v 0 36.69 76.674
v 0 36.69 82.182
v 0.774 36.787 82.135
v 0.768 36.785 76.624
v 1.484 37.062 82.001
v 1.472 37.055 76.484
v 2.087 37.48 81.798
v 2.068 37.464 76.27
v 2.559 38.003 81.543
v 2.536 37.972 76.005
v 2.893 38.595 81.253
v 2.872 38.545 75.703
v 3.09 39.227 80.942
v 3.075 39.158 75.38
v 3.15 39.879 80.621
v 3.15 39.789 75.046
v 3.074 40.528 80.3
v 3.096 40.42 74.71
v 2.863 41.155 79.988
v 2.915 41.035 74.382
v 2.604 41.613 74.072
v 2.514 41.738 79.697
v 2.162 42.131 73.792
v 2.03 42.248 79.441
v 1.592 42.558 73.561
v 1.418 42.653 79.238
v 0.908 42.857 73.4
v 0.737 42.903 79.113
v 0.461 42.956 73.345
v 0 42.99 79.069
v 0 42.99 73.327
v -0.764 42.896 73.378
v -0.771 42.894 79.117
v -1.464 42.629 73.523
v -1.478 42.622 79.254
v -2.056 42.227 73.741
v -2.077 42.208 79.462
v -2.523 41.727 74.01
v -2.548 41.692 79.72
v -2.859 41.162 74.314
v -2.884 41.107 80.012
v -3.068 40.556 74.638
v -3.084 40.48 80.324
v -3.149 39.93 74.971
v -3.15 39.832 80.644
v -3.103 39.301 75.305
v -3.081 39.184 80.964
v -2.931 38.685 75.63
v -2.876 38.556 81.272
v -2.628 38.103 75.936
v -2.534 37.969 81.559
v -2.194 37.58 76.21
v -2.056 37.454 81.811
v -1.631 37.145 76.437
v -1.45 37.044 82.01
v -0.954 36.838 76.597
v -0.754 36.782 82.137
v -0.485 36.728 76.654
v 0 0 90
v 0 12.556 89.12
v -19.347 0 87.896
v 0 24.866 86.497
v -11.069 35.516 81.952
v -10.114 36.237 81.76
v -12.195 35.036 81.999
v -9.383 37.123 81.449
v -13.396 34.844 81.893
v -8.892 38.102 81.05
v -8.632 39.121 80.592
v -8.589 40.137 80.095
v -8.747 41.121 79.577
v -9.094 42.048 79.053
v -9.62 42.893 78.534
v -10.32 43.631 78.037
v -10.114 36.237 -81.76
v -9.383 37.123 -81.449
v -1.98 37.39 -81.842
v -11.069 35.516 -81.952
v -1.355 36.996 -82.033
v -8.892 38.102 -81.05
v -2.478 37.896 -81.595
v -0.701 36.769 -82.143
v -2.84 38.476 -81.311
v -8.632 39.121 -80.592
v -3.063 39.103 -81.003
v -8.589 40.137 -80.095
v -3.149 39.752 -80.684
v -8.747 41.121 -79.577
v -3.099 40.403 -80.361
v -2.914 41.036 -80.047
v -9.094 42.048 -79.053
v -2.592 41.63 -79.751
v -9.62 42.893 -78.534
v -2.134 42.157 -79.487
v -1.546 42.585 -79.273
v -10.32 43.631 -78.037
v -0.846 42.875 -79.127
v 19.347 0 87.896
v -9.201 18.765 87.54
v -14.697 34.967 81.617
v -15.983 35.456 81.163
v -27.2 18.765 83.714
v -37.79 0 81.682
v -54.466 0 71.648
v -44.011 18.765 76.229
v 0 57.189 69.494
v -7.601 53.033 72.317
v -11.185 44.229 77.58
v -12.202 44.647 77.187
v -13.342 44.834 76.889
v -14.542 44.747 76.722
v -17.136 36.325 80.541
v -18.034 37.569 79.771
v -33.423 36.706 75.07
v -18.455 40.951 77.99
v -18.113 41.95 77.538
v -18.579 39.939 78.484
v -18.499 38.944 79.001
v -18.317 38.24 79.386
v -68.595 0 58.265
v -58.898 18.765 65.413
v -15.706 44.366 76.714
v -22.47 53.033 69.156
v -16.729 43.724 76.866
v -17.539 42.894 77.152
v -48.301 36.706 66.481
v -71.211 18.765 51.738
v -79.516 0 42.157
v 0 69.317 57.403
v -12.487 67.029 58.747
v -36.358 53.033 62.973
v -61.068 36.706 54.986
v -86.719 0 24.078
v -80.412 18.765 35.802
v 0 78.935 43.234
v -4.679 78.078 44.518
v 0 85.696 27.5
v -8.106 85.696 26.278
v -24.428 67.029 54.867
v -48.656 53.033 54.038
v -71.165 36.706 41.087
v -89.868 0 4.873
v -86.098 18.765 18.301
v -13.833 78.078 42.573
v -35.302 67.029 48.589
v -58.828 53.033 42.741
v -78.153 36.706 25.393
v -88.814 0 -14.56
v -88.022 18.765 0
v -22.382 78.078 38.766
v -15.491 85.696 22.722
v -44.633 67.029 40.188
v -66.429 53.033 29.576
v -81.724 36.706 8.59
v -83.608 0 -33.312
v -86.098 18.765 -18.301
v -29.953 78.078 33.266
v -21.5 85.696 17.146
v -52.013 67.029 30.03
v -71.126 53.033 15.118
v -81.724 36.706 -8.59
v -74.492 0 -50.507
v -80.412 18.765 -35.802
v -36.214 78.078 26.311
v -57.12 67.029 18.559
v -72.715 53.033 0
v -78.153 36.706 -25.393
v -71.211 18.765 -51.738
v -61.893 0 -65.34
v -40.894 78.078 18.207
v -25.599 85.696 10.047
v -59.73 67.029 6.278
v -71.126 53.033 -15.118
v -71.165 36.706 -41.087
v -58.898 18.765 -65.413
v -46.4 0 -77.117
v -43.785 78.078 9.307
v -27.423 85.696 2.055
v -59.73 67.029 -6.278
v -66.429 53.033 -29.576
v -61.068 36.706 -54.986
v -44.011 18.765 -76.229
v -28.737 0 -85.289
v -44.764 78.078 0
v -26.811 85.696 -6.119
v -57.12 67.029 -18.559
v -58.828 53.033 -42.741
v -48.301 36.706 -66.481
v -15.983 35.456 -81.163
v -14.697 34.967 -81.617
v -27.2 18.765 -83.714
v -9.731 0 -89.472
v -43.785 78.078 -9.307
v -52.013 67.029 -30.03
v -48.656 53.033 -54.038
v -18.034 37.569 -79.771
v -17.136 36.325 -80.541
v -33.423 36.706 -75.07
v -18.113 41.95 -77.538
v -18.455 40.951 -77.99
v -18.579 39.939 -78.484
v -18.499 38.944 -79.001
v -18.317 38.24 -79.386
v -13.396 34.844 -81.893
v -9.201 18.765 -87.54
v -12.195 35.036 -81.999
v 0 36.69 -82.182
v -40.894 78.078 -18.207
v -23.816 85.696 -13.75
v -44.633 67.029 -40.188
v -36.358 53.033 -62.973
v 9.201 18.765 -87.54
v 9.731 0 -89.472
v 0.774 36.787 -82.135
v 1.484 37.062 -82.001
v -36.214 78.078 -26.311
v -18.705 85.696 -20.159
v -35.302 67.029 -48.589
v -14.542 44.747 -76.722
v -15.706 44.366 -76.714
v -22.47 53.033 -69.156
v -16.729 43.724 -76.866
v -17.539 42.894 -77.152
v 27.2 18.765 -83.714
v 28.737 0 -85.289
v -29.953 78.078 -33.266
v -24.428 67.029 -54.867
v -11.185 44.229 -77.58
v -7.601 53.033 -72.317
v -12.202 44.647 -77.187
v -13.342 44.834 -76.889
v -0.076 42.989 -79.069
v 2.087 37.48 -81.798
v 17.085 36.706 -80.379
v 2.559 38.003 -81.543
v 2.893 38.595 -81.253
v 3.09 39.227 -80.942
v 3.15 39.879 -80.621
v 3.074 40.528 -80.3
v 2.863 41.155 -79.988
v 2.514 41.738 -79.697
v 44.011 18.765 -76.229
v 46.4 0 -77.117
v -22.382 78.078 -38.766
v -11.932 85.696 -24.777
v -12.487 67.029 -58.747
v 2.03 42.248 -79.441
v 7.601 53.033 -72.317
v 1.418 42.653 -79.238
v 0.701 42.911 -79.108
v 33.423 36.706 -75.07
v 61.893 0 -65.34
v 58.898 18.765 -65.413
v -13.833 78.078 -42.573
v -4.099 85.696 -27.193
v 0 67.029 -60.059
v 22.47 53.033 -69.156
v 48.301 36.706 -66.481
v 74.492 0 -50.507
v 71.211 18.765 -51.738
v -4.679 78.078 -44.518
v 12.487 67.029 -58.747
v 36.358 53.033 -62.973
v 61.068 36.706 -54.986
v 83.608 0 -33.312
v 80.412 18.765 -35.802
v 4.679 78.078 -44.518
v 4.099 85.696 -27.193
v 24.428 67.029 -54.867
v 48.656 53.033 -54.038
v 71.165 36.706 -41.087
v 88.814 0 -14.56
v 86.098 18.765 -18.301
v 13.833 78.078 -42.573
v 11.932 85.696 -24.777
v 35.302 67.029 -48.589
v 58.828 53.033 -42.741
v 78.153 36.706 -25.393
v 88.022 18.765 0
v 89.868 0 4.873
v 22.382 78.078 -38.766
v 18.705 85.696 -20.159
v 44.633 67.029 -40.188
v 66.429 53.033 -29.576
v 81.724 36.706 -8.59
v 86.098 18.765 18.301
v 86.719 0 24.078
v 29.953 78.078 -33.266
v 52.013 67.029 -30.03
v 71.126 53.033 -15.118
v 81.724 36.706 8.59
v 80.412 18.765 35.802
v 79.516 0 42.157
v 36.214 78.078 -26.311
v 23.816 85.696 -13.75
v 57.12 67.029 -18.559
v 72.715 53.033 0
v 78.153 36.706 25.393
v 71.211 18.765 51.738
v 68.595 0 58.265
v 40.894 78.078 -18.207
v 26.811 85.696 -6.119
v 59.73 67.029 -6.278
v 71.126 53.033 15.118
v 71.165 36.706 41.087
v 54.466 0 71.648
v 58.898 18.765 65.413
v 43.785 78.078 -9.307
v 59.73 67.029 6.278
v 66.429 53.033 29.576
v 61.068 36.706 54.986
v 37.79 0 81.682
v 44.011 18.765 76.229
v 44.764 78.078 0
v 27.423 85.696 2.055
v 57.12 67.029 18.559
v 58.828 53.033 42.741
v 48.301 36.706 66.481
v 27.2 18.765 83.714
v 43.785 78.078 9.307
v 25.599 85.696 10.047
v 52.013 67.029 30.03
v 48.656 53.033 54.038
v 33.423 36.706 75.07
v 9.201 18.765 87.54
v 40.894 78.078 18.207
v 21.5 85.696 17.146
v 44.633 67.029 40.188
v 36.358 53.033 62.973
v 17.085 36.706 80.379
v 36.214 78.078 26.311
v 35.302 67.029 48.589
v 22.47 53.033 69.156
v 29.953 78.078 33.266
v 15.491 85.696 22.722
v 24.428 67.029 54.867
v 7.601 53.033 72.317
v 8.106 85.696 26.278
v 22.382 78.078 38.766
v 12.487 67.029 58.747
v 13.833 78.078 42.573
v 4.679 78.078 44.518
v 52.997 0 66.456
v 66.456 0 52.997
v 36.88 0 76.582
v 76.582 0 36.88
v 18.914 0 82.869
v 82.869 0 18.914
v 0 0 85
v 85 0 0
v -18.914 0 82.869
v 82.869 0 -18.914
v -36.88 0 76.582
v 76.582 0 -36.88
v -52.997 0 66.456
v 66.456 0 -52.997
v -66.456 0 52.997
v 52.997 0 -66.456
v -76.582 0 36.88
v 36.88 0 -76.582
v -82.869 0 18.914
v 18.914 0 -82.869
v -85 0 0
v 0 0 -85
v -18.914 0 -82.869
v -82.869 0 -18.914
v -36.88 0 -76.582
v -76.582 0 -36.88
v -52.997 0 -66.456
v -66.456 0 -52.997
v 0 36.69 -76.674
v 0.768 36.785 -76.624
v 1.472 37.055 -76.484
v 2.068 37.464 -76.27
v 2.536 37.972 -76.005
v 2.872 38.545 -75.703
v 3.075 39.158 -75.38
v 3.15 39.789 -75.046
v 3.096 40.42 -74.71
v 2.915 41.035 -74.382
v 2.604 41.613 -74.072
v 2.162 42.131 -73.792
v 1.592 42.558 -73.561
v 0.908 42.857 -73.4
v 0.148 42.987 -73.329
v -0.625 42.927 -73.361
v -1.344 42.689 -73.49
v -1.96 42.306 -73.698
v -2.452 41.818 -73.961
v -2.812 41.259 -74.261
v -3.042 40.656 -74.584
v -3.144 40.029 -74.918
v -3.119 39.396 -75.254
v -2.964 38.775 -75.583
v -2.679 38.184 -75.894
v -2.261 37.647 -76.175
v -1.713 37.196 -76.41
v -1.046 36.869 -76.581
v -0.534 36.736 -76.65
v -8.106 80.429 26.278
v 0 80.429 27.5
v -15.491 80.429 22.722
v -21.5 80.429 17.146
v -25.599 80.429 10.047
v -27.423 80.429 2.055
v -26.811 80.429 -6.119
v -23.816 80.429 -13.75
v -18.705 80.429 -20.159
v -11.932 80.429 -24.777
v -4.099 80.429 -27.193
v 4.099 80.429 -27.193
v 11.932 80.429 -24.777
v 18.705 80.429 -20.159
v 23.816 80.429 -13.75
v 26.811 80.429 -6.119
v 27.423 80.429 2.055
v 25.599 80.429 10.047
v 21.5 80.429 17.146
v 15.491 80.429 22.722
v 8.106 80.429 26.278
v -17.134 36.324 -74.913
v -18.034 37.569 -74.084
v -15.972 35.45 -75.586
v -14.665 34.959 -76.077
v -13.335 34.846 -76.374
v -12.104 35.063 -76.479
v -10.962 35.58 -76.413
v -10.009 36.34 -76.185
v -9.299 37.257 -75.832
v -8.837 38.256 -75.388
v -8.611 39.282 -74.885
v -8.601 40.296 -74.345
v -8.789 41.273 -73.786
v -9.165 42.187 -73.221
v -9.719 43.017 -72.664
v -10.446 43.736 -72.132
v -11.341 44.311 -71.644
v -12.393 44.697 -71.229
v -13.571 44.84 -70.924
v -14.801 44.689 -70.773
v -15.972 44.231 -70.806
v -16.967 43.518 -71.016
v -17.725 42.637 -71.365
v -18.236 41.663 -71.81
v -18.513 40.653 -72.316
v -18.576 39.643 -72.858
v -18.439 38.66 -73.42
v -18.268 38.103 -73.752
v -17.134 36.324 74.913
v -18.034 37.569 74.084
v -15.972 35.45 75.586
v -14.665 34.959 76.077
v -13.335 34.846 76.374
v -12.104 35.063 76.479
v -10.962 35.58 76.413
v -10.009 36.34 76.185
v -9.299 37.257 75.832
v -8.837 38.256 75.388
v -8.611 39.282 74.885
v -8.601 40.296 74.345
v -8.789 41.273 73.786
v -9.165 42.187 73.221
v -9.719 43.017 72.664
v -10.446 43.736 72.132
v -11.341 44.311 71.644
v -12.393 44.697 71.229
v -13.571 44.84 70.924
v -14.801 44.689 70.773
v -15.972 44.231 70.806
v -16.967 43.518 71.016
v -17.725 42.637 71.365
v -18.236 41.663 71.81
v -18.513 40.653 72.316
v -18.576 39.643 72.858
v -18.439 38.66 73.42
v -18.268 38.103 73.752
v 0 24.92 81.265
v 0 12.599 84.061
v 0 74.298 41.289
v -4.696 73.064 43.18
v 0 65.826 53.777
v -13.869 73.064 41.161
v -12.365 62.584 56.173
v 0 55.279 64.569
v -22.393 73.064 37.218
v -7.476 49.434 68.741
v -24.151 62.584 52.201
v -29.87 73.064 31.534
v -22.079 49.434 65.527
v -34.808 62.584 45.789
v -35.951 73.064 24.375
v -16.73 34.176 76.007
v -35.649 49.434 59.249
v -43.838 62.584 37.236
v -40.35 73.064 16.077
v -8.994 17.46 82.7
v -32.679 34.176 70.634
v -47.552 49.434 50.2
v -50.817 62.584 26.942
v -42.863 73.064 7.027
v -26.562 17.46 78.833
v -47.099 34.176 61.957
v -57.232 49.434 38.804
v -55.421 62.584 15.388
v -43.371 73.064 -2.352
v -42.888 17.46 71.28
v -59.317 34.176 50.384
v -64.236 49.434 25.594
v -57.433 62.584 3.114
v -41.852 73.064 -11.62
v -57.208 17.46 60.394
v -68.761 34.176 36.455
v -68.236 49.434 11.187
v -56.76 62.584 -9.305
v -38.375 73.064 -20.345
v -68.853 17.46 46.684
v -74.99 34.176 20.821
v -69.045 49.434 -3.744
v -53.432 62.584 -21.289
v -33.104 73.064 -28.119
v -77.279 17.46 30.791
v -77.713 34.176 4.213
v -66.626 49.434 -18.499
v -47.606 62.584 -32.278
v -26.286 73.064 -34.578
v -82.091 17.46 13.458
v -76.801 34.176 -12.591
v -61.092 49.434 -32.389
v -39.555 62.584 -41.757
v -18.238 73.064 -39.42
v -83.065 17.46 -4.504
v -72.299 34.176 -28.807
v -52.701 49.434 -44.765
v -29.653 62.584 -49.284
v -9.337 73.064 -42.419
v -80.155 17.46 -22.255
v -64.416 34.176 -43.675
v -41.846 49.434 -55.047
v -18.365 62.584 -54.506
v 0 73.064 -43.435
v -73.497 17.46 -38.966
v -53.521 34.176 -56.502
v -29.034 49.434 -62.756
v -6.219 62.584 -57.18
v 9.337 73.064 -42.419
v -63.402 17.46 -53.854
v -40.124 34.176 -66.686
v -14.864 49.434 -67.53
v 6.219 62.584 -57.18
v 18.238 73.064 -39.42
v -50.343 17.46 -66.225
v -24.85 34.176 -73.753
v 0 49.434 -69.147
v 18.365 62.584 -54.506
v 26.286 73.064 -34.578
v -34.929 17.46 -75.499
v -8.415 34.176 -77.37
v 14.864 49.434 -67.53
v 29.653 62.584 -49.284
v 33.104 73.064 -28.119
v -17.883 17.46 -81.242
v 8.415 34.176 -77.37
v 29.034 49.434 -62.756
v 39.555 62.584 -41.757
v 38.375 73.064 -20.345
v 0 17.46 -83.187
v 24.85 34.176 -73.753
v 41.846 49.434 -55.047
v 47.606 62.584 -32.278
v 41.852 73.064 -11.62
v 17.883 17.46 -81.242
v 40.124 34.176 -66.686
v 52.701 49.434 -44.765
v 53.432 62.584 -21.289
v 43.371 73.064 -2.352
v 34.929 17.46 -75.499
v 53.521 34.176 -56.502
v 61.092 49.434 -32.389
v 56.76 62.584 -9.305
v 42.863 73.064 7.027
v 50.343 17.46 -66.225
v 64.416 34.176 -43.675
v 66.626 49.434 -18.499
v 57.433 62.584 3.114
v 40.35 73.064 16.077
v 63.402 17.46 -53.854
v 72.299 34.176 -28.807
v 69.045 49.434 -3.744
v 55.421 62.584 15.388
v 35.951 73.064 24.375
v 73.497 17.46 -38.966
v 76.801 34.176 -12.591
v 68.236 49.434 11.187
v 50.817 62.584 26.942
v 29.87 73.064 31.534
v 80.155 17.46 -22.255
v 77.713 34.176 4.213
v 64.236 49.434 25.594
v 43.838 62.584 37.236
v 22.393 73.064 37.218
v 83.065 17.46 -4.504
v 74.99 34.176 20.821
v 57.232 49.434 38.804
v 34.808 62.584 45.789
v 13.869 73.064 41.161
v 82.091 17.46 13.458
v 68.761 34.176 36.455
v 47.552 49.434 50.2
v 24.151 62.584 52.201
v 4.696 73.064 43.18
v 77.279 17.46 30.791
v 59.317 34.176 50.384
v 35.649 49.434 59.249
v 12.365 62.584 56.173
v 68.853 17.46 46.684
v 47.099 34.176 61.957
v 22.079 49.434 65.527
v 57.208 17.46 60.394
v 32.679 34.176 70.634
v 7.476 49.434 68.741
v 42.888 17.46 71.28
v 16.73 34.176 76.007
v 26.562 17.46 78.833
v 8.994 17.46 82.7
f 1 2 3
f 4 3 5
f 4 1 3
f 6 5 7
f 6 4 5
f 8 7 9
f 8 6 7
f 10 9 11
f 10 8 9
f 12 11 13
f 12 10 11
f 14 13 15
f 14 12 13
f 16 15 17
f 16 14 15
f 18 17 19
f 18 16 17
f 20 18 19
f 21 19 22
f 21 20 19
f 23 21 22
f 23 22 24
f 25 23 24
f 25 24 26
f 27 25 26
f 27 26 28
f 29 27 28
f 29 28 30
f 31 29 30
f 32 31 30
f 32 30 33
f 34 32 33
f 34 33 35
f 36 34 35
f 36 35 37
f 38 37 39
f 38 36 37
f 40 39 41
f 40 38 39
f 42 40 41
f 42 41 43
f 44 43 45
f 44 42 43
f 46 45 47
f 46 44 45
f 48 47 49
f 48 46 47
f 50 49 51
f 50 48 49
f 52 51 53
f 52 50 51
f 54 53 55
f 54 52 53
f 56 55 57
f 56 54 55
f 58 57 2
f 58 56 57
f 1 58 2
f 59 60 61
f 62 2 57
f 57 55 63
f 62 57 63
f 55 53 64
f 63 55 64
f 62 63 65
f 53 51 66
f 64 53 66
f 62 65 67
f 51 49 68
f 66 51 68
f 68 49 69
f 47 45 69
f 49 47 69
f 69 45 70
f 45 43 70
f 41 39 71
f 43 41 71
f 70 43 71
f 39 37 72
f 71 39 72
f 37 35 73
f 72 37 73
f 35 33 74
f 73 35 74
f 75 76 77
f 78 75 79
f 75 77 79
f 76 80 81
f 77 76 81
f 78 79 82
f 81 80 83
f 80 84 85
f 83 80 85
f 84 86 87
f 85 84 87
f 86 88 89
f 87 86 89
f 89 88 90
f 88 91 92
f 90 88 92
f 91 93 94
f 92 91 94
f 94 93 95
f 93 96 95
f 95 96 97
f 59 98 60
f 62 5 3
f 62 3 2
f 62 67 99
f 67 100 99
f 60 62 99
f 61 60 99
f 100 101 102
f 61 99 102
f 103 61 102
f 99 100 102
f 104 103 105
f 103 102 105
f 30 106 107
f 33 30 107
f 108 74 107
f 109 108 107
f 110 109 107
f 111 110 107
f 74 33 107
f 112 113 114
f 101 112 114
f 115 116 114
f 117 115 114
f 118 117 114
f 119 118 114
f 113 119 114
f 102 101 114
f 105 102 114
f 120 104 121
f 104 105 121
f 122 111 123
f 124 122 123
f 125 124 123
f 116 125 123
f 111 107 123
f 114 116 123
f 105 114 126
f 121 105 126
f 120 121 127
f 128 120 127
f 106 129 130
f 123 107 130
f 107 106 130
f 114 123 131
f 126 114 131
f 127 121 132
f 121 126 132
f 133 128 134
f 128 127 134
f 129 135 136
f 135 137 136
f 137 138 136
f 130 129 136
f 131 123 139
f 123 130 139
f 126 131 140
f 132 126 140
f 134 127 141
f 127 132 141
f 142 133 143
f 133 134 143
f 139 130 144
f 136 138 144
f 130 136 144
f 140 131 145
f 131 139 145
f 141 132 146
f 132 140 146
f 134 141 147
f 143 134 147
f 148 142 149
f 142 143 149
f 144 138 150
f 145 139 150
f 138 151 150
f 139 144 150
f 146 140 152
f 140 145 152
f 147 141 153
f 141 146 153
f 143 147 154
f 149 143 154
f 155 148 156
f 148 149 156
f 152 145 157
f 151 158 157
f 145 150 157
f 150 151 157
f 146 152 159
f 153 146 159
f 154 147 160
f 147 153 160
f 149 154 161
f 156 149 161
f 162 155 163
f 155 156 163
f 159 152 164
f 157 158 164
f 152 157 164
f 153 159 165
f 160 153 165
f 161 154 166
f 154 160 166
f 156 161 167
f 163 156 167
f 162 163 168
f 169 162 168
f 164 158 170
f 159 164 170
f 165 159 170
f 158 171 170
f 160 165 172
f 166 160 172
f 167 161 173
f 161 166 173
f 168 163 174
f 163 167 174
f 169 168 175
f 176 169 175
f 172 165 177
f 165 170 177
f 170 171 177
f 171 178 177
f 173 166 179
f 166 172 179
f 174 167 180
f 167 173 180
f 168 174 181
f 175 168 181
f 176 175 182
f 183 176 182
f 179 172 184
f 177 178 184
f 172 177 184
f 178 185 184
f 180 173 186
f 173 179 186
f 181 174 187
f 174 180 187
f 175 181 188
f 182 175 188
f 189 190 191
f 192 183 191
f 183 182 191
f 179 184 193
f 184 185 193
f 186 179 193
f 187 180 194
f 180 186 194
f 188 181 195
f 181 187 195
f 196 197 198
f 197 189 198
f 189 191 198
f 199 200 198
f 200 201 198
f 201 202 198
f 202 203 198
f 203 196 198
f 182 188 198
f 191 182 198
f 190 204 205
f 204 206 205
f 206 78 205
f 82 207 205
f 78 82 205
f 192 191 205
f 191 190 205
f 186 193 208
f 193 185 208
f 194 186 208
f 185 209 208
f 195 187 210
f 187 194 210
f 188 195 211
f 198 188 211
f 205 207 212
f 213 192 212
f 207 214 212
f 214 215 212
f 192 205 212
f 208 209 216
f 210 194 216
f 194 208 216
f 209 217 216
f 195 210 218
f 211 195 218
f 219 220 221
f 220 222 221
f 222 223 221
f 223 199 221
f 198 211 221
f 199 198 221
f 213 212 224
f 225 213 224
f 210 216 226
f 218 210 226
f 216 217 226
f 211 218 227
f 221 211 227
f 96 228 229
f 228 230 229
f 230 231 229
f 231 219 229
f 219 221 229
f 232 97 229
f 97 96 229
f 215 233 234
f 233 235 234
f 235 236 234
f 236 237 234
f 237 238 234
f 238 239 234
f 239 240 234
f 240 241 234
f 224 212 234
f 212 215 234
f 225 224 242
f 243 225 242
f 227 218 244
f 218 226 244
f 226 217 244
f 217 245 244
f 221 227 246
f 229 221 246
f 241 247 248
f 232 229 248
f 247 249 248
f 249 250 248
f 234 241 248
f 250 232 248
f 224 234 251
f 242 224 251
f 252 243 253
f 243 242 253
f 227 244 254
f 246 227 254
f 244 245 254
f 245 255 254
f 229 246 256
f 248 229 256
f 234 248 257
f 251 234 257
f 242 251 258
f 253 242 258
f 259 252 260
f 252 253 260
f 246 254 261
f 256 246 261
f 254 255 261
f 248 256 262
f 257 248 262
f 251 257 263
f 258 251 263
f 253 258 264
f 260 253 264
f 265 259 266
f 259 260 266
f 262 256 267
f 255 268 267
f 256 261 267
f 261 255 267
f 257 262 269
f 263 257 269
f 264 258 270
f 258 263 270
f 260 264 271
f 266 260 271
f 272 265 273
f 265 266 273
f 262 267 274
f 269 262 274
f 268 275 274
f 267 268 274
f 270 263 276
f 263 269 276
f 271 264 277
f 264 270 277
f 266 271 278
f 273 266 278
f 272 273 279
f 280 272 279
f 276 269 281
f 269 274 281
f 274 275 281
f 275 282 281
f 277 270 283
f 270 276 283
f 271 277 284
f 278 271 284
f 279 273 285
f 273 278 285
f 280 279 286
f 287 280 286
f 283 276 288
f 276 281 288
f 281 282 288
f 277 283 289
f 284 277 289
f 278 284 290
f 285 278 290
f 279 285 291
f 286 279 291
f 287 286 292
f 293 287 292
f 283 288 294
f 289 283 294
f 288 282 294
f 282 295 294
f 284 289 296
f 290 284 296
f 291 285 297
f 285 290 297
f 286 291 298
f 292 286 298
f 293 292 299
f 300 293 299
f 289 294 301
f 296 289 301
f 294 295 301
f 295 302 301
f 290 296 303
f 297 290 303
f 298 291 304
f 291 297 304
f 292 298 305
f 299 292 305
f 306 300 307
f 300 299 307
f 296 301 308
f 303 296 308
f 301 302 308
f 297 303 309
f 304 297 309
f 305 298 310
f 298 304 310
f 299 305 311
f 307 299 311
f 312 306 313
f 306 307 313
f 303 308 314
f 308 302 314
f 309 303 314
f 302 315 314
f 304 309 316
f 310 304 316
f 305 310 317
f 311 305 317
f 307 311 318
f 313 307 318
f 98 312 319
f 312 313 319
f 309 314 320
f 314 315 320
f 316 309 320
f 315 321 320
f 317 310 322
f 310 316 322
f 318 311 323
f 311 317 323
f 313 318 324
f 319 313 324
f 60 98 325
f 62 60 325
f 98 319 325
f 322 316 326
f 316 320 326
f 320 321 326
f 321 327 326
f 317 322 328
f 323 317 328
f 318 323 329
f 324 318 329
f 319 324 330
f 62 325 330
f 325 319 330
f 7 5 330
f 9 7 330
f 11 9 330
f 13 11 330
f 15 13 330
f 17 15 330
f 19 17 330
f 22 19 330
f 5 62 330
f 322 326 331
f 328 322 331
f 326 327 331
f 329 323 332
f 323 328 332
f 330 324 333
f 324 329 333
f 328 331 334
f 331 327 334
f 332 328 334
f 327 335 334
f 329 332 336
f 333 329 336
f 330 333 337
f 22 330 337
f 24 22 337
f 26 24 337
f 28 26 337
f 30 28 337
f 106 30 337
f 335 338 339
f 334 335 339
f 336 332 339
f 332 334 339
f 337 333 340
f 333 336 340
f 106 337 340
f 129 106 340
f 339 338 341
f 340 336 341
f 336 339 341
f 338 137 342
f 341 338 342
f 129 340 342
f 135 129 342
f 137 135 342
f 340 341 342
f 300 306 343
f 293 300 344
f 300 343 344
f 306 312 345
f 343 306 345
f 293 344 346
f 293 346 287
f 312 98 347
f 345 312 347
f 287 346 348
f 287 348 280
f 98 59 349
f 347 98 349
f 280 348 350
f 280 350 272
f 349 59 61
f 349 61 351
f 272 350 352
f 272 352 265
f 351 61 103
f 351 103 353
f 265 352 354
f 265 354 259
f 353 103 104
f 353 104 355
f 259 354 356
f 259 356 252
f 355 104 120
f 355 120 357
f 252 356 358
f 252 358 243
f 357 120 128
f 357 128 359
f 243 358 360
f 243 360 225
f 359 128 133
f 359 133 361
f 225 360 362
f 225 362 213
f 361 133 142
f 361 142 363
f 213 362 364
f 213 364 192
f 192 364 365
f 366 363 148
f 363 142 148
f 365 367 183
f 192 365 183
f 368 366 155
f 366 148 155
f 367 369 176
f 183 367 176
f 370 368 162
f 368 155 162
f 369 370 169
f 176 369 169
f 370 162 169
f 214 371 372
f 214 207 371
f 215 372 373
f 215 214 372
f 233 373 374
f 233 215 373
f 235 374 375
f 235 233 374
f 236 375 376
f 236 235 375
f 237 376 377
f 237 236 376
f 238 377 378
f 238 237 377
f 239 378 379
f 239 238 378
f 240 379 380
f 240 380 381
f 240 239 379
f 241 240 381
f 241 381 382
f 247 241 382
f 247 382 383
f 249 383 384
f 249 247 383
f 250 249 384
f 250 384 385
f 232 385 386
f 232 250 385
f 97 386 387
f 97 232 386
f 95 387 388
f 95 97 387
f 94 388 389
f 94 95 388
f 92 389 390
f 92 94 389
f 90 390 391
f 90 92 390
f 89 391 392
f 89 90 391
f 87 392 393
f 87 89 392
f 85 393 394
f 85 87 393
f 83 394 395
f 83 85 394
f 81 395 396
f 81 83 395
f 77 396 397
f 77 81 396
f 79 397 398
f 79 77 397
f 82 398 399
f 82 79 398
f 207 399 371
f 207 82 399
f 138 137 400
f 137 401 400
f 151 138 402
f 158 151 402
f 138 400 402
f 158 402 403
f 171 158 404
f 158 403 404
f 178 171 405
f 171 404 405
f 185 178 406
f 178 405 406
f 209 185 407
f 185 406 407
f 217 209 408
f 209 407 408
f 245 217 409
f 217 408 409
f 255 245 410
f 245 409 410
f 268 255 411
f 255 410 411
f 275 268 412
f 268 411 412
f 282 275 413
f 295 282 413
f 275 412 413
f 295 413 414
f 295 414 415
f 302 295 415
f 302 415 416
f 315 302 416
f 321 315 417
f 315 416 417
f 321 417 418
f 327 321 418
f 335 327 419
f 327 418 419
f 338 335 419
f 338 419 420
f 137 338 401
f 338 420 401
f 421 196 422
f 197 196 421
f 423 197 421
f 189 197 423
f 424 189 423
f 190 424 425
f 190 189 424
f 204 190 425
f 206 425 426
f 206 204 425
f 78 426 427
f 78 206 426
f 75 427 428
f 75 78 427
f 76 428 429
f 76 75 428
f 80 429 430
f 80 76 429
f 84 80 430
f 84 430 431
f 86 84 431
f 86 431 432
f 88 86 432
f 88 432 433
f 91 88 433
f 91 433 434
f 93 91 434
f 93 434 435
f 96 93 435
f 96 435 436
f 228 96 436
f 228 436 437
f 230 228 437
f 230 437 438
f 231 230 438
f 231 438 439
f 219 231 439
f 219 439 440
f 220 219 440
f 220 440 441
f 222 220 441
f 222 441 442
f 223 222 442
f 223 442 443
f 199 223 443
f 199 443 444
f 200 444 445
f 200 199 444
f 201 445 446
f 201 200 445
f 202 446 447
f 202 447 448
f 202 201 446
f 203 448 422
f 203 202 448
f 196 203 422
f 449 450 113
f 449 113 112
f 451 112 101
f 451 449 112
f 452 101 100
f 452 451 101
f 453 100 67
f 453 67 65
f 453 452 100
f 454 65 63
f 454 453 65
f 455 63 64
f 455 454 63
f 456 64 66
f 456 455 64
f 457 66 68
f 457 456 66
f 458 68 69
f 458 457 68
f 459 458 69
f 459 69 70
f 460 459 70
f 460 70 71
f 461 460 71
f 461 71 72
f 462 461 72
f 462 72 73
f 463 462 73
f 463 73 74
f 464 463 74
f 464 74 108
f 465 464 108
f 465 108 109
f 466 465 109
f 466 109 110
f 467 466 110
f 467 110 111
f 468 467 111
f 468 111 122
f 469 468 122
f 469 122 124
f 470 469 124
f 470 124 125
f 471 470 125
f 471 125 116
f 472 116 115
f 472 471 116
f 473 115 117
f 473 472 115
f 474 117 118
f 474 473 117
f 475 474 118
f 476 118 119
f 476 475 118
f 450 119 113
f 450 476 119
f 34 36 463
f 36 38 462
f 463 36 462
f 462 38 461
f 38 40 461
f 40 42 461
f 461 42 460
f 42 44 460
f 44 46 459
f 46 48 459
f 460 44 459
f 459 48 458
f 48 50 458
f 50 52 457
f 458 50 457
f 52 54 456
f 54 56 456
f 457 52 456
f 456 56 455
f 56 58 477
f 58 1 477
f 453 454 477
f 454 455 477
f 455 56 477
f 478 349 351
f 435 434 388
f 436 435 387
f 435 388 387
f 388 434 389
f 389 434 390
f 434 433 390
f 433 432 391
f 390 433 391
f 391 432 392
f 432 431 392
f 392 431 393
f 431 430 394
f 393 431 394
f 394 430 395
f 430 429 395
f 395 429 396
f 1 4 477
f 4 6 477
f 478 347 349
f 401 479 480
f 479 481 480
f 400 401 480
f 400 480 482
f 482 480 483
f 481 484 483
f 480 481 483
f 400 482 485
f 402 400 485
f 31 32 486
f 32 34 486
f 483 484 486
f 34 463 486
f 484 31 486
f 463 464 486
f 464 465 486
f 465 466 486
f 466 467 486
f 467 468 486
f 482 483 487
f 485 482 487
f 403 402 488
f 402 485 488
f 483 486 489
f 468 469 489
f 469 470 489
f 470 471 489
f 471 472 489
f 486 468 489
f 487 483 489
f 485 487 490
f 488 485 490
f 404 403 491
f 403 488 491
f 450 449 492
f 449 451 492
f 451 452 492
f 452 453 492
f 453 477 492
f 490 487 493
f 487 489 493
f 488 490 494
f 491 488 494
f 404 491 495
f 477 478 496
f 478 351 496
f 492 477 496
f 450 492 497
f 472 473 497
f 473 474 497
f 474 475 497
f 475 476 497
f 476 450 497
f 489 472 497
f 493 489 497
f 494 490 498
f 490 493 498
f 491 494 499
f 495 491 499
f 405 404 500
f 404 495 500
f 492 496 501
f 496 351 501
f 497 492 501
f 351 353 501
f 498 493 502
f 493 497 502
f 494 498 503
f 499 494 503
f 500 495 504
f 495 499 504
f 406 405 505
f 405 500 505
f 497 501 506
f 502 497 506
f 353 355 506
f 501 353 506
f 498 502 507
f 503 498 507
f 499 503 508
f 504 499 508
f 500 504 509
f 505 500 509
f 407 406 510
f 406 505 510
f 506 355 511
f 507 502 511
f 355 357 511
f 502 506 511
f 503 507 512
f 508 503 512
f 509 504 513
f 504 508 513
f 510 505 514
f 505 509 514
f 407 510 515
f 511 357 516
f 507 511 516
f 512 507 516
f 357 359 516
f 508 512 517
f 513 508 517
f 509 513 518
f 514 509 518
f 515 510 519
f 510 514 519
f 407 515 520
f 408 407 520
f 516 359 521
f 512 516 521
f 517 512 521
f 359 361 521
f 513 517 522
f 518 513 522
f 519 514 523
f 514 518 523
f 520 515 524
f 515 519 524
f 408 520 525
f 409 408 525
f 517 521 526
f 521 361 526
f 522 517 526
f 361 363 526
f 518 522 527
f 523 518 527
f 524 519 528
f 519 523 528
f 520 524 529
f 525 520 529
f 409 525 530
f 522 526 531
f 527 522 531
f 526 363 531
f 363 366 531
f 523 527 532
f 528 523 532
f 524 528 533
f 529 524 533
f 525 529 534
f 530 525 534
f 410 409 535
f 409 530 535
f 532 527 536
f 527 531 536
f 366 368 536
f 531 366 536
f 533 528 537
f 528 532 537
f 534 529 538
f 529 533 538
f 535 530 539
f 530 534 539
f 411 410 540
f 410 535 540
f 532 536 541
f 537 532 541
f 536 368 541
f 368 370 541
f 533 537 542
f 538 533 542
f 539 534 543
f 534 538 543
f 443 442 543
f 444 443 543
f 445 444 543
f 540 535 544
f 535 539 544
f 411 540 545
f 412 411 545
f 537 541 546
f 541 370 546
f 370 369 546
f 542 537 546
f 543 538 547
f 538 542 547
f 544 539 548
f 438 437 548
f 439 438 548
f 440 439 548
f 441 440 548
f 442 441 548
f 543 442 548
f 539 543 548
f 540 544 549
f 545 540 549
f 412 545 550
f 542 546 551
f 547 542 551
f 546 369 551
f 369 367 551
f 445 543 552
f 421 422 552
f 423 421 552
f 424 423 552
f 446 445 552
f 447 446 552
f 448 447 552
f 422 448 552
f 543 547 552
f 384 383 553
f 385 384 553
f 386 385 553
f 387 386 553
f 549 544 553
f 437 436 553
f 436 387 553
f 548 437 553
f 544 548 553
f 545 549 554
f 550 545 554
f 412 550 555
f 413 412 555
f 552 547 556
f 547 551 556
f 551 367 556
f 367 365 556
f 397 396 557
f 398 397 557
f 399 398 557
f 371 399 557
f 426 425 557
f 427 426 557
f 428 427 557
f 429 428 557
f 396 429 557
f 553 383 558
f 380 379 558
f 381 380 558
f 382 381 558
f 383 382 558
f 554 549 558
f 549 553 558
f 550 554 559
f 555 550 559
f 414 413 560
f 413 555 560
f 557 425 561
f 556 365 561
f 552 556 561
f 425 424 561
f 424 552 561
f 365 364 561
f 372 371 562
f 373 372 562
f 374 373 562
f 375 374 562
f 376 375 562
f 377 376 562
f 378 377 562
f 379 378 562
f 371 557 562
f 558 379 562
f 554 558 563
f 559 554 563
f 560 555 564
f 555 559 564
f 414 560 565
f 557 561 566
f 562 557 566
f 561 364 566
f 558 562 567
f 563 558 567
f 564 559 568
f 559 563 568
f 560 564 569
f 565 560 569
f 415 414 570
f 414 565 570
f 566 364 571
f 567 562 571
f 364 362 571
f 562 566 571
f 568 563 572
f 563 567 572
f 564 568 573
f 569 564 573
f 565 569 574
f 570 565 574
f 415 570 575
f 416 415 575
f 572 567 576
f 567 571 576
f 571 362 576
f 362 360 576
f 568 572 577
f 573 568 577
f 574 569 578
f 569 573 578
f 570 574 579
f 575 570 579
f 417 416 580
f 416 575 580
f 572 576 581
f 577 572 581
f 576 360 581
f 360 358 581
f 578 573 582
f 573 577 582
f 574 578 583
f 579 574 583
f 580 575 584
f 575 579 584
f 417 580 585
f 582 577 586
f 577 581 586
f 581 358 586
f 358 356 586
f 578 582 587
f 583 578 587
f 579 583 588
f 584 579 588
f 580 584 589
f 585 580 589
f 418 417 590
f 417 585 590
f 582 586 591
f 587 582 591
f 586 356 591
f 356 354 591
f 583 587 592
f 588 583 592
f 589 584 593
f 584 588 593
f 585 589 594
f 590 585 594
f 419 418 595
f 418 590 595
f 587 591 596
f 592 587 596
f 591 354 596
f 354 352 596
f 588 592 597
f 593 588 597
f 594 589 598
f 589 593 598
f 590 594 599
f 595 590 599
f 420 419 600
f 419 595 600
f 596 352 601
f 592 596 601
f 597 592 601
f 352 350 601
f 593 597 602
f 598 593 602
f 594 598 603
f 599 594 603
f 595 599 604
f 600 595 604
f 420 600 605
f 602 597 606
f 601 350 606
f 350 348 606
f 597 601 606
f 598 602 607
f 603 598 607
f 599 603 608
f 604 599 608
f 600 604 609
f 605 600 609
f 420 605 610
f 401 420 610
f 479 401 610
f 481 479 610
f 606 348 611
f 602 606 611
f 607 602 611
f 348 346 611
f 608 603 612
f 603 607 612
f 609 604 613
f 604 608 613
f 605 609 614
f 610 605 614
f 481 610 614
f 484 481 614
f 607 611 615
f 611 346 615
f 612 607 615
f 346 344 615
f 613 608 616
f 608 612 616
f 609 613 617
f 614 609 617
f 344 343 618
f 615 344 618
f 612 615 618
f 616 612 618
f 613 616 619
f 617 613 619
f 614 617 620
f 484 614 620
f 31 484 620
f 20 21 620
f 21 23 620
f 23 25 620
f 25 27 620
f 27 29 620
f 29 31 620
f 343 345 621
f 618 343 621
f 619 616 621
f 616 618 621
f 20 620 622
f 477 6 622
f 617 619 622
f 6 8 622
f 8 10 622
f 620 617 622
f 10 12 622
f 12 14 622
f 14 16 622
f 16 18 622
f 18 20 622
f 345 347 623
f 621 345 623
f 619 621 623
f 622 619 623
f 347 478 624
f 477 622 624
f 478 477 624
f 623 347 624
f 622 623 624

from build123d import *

# Parameters (mm, degrees)
CUT_EXTRUDE5_DEPTH      = 154.439727581
CUT_EXTRUDE5_DEPTH_BACK = 154.439727581
SKETCH7_R               = 3.15
SKETCH7_R_2             = 5


with BuildPart() as part:
    # Sketch1 → Revolve1 (revolve)
    with BuildSketch(Plane.XY, mode=Mode.PRIVATE) as revolve1_sk:
        with BuildLine():
            Line((85, 0), (90, 0))
            ThreePointArc((90, 0), (72.715197861, 53.033008589), (27.5, 85.695682505))
            Line((27.5, 85.695682505), (27.5, 80.428539711))
            ThreePointArc((27.5, 80.428539711), (69.14658343, 49.434299833), (85, 0))
        make_face()
    revolve(revolve1_sk.sketch.rotate(Axis((0, 188.683155316, 0), (0, -1, 0)), 90), axis=Axis((0, 188.683155316, 0), (0, -1, 0)))

    # Sketch7 → Cut-Extrude5 (cut, two sides: drawn at the far end of the back side and taken through both)
    with BuildSketch(Plane.XY.offset(-CUT_EXTRUDE5_DEPTH_BACK)):
        with Locations(Location((0, 39.840172705, 0), (0, 0, 269.999999991))):
            Circle(SKETCH7_R)
        with Locations(Location((-13.579797877, 39.840172705, 0), (0, 0, 207.021474241))):
            Circle(SKETCH7_R_2)
    extrude(amount=CUT_EXTRUDE5_DEPTH + CUT_EXTRUDE5_DEPTH_BACK, mode=Mode.SUBTRACT)


solid = part.part
